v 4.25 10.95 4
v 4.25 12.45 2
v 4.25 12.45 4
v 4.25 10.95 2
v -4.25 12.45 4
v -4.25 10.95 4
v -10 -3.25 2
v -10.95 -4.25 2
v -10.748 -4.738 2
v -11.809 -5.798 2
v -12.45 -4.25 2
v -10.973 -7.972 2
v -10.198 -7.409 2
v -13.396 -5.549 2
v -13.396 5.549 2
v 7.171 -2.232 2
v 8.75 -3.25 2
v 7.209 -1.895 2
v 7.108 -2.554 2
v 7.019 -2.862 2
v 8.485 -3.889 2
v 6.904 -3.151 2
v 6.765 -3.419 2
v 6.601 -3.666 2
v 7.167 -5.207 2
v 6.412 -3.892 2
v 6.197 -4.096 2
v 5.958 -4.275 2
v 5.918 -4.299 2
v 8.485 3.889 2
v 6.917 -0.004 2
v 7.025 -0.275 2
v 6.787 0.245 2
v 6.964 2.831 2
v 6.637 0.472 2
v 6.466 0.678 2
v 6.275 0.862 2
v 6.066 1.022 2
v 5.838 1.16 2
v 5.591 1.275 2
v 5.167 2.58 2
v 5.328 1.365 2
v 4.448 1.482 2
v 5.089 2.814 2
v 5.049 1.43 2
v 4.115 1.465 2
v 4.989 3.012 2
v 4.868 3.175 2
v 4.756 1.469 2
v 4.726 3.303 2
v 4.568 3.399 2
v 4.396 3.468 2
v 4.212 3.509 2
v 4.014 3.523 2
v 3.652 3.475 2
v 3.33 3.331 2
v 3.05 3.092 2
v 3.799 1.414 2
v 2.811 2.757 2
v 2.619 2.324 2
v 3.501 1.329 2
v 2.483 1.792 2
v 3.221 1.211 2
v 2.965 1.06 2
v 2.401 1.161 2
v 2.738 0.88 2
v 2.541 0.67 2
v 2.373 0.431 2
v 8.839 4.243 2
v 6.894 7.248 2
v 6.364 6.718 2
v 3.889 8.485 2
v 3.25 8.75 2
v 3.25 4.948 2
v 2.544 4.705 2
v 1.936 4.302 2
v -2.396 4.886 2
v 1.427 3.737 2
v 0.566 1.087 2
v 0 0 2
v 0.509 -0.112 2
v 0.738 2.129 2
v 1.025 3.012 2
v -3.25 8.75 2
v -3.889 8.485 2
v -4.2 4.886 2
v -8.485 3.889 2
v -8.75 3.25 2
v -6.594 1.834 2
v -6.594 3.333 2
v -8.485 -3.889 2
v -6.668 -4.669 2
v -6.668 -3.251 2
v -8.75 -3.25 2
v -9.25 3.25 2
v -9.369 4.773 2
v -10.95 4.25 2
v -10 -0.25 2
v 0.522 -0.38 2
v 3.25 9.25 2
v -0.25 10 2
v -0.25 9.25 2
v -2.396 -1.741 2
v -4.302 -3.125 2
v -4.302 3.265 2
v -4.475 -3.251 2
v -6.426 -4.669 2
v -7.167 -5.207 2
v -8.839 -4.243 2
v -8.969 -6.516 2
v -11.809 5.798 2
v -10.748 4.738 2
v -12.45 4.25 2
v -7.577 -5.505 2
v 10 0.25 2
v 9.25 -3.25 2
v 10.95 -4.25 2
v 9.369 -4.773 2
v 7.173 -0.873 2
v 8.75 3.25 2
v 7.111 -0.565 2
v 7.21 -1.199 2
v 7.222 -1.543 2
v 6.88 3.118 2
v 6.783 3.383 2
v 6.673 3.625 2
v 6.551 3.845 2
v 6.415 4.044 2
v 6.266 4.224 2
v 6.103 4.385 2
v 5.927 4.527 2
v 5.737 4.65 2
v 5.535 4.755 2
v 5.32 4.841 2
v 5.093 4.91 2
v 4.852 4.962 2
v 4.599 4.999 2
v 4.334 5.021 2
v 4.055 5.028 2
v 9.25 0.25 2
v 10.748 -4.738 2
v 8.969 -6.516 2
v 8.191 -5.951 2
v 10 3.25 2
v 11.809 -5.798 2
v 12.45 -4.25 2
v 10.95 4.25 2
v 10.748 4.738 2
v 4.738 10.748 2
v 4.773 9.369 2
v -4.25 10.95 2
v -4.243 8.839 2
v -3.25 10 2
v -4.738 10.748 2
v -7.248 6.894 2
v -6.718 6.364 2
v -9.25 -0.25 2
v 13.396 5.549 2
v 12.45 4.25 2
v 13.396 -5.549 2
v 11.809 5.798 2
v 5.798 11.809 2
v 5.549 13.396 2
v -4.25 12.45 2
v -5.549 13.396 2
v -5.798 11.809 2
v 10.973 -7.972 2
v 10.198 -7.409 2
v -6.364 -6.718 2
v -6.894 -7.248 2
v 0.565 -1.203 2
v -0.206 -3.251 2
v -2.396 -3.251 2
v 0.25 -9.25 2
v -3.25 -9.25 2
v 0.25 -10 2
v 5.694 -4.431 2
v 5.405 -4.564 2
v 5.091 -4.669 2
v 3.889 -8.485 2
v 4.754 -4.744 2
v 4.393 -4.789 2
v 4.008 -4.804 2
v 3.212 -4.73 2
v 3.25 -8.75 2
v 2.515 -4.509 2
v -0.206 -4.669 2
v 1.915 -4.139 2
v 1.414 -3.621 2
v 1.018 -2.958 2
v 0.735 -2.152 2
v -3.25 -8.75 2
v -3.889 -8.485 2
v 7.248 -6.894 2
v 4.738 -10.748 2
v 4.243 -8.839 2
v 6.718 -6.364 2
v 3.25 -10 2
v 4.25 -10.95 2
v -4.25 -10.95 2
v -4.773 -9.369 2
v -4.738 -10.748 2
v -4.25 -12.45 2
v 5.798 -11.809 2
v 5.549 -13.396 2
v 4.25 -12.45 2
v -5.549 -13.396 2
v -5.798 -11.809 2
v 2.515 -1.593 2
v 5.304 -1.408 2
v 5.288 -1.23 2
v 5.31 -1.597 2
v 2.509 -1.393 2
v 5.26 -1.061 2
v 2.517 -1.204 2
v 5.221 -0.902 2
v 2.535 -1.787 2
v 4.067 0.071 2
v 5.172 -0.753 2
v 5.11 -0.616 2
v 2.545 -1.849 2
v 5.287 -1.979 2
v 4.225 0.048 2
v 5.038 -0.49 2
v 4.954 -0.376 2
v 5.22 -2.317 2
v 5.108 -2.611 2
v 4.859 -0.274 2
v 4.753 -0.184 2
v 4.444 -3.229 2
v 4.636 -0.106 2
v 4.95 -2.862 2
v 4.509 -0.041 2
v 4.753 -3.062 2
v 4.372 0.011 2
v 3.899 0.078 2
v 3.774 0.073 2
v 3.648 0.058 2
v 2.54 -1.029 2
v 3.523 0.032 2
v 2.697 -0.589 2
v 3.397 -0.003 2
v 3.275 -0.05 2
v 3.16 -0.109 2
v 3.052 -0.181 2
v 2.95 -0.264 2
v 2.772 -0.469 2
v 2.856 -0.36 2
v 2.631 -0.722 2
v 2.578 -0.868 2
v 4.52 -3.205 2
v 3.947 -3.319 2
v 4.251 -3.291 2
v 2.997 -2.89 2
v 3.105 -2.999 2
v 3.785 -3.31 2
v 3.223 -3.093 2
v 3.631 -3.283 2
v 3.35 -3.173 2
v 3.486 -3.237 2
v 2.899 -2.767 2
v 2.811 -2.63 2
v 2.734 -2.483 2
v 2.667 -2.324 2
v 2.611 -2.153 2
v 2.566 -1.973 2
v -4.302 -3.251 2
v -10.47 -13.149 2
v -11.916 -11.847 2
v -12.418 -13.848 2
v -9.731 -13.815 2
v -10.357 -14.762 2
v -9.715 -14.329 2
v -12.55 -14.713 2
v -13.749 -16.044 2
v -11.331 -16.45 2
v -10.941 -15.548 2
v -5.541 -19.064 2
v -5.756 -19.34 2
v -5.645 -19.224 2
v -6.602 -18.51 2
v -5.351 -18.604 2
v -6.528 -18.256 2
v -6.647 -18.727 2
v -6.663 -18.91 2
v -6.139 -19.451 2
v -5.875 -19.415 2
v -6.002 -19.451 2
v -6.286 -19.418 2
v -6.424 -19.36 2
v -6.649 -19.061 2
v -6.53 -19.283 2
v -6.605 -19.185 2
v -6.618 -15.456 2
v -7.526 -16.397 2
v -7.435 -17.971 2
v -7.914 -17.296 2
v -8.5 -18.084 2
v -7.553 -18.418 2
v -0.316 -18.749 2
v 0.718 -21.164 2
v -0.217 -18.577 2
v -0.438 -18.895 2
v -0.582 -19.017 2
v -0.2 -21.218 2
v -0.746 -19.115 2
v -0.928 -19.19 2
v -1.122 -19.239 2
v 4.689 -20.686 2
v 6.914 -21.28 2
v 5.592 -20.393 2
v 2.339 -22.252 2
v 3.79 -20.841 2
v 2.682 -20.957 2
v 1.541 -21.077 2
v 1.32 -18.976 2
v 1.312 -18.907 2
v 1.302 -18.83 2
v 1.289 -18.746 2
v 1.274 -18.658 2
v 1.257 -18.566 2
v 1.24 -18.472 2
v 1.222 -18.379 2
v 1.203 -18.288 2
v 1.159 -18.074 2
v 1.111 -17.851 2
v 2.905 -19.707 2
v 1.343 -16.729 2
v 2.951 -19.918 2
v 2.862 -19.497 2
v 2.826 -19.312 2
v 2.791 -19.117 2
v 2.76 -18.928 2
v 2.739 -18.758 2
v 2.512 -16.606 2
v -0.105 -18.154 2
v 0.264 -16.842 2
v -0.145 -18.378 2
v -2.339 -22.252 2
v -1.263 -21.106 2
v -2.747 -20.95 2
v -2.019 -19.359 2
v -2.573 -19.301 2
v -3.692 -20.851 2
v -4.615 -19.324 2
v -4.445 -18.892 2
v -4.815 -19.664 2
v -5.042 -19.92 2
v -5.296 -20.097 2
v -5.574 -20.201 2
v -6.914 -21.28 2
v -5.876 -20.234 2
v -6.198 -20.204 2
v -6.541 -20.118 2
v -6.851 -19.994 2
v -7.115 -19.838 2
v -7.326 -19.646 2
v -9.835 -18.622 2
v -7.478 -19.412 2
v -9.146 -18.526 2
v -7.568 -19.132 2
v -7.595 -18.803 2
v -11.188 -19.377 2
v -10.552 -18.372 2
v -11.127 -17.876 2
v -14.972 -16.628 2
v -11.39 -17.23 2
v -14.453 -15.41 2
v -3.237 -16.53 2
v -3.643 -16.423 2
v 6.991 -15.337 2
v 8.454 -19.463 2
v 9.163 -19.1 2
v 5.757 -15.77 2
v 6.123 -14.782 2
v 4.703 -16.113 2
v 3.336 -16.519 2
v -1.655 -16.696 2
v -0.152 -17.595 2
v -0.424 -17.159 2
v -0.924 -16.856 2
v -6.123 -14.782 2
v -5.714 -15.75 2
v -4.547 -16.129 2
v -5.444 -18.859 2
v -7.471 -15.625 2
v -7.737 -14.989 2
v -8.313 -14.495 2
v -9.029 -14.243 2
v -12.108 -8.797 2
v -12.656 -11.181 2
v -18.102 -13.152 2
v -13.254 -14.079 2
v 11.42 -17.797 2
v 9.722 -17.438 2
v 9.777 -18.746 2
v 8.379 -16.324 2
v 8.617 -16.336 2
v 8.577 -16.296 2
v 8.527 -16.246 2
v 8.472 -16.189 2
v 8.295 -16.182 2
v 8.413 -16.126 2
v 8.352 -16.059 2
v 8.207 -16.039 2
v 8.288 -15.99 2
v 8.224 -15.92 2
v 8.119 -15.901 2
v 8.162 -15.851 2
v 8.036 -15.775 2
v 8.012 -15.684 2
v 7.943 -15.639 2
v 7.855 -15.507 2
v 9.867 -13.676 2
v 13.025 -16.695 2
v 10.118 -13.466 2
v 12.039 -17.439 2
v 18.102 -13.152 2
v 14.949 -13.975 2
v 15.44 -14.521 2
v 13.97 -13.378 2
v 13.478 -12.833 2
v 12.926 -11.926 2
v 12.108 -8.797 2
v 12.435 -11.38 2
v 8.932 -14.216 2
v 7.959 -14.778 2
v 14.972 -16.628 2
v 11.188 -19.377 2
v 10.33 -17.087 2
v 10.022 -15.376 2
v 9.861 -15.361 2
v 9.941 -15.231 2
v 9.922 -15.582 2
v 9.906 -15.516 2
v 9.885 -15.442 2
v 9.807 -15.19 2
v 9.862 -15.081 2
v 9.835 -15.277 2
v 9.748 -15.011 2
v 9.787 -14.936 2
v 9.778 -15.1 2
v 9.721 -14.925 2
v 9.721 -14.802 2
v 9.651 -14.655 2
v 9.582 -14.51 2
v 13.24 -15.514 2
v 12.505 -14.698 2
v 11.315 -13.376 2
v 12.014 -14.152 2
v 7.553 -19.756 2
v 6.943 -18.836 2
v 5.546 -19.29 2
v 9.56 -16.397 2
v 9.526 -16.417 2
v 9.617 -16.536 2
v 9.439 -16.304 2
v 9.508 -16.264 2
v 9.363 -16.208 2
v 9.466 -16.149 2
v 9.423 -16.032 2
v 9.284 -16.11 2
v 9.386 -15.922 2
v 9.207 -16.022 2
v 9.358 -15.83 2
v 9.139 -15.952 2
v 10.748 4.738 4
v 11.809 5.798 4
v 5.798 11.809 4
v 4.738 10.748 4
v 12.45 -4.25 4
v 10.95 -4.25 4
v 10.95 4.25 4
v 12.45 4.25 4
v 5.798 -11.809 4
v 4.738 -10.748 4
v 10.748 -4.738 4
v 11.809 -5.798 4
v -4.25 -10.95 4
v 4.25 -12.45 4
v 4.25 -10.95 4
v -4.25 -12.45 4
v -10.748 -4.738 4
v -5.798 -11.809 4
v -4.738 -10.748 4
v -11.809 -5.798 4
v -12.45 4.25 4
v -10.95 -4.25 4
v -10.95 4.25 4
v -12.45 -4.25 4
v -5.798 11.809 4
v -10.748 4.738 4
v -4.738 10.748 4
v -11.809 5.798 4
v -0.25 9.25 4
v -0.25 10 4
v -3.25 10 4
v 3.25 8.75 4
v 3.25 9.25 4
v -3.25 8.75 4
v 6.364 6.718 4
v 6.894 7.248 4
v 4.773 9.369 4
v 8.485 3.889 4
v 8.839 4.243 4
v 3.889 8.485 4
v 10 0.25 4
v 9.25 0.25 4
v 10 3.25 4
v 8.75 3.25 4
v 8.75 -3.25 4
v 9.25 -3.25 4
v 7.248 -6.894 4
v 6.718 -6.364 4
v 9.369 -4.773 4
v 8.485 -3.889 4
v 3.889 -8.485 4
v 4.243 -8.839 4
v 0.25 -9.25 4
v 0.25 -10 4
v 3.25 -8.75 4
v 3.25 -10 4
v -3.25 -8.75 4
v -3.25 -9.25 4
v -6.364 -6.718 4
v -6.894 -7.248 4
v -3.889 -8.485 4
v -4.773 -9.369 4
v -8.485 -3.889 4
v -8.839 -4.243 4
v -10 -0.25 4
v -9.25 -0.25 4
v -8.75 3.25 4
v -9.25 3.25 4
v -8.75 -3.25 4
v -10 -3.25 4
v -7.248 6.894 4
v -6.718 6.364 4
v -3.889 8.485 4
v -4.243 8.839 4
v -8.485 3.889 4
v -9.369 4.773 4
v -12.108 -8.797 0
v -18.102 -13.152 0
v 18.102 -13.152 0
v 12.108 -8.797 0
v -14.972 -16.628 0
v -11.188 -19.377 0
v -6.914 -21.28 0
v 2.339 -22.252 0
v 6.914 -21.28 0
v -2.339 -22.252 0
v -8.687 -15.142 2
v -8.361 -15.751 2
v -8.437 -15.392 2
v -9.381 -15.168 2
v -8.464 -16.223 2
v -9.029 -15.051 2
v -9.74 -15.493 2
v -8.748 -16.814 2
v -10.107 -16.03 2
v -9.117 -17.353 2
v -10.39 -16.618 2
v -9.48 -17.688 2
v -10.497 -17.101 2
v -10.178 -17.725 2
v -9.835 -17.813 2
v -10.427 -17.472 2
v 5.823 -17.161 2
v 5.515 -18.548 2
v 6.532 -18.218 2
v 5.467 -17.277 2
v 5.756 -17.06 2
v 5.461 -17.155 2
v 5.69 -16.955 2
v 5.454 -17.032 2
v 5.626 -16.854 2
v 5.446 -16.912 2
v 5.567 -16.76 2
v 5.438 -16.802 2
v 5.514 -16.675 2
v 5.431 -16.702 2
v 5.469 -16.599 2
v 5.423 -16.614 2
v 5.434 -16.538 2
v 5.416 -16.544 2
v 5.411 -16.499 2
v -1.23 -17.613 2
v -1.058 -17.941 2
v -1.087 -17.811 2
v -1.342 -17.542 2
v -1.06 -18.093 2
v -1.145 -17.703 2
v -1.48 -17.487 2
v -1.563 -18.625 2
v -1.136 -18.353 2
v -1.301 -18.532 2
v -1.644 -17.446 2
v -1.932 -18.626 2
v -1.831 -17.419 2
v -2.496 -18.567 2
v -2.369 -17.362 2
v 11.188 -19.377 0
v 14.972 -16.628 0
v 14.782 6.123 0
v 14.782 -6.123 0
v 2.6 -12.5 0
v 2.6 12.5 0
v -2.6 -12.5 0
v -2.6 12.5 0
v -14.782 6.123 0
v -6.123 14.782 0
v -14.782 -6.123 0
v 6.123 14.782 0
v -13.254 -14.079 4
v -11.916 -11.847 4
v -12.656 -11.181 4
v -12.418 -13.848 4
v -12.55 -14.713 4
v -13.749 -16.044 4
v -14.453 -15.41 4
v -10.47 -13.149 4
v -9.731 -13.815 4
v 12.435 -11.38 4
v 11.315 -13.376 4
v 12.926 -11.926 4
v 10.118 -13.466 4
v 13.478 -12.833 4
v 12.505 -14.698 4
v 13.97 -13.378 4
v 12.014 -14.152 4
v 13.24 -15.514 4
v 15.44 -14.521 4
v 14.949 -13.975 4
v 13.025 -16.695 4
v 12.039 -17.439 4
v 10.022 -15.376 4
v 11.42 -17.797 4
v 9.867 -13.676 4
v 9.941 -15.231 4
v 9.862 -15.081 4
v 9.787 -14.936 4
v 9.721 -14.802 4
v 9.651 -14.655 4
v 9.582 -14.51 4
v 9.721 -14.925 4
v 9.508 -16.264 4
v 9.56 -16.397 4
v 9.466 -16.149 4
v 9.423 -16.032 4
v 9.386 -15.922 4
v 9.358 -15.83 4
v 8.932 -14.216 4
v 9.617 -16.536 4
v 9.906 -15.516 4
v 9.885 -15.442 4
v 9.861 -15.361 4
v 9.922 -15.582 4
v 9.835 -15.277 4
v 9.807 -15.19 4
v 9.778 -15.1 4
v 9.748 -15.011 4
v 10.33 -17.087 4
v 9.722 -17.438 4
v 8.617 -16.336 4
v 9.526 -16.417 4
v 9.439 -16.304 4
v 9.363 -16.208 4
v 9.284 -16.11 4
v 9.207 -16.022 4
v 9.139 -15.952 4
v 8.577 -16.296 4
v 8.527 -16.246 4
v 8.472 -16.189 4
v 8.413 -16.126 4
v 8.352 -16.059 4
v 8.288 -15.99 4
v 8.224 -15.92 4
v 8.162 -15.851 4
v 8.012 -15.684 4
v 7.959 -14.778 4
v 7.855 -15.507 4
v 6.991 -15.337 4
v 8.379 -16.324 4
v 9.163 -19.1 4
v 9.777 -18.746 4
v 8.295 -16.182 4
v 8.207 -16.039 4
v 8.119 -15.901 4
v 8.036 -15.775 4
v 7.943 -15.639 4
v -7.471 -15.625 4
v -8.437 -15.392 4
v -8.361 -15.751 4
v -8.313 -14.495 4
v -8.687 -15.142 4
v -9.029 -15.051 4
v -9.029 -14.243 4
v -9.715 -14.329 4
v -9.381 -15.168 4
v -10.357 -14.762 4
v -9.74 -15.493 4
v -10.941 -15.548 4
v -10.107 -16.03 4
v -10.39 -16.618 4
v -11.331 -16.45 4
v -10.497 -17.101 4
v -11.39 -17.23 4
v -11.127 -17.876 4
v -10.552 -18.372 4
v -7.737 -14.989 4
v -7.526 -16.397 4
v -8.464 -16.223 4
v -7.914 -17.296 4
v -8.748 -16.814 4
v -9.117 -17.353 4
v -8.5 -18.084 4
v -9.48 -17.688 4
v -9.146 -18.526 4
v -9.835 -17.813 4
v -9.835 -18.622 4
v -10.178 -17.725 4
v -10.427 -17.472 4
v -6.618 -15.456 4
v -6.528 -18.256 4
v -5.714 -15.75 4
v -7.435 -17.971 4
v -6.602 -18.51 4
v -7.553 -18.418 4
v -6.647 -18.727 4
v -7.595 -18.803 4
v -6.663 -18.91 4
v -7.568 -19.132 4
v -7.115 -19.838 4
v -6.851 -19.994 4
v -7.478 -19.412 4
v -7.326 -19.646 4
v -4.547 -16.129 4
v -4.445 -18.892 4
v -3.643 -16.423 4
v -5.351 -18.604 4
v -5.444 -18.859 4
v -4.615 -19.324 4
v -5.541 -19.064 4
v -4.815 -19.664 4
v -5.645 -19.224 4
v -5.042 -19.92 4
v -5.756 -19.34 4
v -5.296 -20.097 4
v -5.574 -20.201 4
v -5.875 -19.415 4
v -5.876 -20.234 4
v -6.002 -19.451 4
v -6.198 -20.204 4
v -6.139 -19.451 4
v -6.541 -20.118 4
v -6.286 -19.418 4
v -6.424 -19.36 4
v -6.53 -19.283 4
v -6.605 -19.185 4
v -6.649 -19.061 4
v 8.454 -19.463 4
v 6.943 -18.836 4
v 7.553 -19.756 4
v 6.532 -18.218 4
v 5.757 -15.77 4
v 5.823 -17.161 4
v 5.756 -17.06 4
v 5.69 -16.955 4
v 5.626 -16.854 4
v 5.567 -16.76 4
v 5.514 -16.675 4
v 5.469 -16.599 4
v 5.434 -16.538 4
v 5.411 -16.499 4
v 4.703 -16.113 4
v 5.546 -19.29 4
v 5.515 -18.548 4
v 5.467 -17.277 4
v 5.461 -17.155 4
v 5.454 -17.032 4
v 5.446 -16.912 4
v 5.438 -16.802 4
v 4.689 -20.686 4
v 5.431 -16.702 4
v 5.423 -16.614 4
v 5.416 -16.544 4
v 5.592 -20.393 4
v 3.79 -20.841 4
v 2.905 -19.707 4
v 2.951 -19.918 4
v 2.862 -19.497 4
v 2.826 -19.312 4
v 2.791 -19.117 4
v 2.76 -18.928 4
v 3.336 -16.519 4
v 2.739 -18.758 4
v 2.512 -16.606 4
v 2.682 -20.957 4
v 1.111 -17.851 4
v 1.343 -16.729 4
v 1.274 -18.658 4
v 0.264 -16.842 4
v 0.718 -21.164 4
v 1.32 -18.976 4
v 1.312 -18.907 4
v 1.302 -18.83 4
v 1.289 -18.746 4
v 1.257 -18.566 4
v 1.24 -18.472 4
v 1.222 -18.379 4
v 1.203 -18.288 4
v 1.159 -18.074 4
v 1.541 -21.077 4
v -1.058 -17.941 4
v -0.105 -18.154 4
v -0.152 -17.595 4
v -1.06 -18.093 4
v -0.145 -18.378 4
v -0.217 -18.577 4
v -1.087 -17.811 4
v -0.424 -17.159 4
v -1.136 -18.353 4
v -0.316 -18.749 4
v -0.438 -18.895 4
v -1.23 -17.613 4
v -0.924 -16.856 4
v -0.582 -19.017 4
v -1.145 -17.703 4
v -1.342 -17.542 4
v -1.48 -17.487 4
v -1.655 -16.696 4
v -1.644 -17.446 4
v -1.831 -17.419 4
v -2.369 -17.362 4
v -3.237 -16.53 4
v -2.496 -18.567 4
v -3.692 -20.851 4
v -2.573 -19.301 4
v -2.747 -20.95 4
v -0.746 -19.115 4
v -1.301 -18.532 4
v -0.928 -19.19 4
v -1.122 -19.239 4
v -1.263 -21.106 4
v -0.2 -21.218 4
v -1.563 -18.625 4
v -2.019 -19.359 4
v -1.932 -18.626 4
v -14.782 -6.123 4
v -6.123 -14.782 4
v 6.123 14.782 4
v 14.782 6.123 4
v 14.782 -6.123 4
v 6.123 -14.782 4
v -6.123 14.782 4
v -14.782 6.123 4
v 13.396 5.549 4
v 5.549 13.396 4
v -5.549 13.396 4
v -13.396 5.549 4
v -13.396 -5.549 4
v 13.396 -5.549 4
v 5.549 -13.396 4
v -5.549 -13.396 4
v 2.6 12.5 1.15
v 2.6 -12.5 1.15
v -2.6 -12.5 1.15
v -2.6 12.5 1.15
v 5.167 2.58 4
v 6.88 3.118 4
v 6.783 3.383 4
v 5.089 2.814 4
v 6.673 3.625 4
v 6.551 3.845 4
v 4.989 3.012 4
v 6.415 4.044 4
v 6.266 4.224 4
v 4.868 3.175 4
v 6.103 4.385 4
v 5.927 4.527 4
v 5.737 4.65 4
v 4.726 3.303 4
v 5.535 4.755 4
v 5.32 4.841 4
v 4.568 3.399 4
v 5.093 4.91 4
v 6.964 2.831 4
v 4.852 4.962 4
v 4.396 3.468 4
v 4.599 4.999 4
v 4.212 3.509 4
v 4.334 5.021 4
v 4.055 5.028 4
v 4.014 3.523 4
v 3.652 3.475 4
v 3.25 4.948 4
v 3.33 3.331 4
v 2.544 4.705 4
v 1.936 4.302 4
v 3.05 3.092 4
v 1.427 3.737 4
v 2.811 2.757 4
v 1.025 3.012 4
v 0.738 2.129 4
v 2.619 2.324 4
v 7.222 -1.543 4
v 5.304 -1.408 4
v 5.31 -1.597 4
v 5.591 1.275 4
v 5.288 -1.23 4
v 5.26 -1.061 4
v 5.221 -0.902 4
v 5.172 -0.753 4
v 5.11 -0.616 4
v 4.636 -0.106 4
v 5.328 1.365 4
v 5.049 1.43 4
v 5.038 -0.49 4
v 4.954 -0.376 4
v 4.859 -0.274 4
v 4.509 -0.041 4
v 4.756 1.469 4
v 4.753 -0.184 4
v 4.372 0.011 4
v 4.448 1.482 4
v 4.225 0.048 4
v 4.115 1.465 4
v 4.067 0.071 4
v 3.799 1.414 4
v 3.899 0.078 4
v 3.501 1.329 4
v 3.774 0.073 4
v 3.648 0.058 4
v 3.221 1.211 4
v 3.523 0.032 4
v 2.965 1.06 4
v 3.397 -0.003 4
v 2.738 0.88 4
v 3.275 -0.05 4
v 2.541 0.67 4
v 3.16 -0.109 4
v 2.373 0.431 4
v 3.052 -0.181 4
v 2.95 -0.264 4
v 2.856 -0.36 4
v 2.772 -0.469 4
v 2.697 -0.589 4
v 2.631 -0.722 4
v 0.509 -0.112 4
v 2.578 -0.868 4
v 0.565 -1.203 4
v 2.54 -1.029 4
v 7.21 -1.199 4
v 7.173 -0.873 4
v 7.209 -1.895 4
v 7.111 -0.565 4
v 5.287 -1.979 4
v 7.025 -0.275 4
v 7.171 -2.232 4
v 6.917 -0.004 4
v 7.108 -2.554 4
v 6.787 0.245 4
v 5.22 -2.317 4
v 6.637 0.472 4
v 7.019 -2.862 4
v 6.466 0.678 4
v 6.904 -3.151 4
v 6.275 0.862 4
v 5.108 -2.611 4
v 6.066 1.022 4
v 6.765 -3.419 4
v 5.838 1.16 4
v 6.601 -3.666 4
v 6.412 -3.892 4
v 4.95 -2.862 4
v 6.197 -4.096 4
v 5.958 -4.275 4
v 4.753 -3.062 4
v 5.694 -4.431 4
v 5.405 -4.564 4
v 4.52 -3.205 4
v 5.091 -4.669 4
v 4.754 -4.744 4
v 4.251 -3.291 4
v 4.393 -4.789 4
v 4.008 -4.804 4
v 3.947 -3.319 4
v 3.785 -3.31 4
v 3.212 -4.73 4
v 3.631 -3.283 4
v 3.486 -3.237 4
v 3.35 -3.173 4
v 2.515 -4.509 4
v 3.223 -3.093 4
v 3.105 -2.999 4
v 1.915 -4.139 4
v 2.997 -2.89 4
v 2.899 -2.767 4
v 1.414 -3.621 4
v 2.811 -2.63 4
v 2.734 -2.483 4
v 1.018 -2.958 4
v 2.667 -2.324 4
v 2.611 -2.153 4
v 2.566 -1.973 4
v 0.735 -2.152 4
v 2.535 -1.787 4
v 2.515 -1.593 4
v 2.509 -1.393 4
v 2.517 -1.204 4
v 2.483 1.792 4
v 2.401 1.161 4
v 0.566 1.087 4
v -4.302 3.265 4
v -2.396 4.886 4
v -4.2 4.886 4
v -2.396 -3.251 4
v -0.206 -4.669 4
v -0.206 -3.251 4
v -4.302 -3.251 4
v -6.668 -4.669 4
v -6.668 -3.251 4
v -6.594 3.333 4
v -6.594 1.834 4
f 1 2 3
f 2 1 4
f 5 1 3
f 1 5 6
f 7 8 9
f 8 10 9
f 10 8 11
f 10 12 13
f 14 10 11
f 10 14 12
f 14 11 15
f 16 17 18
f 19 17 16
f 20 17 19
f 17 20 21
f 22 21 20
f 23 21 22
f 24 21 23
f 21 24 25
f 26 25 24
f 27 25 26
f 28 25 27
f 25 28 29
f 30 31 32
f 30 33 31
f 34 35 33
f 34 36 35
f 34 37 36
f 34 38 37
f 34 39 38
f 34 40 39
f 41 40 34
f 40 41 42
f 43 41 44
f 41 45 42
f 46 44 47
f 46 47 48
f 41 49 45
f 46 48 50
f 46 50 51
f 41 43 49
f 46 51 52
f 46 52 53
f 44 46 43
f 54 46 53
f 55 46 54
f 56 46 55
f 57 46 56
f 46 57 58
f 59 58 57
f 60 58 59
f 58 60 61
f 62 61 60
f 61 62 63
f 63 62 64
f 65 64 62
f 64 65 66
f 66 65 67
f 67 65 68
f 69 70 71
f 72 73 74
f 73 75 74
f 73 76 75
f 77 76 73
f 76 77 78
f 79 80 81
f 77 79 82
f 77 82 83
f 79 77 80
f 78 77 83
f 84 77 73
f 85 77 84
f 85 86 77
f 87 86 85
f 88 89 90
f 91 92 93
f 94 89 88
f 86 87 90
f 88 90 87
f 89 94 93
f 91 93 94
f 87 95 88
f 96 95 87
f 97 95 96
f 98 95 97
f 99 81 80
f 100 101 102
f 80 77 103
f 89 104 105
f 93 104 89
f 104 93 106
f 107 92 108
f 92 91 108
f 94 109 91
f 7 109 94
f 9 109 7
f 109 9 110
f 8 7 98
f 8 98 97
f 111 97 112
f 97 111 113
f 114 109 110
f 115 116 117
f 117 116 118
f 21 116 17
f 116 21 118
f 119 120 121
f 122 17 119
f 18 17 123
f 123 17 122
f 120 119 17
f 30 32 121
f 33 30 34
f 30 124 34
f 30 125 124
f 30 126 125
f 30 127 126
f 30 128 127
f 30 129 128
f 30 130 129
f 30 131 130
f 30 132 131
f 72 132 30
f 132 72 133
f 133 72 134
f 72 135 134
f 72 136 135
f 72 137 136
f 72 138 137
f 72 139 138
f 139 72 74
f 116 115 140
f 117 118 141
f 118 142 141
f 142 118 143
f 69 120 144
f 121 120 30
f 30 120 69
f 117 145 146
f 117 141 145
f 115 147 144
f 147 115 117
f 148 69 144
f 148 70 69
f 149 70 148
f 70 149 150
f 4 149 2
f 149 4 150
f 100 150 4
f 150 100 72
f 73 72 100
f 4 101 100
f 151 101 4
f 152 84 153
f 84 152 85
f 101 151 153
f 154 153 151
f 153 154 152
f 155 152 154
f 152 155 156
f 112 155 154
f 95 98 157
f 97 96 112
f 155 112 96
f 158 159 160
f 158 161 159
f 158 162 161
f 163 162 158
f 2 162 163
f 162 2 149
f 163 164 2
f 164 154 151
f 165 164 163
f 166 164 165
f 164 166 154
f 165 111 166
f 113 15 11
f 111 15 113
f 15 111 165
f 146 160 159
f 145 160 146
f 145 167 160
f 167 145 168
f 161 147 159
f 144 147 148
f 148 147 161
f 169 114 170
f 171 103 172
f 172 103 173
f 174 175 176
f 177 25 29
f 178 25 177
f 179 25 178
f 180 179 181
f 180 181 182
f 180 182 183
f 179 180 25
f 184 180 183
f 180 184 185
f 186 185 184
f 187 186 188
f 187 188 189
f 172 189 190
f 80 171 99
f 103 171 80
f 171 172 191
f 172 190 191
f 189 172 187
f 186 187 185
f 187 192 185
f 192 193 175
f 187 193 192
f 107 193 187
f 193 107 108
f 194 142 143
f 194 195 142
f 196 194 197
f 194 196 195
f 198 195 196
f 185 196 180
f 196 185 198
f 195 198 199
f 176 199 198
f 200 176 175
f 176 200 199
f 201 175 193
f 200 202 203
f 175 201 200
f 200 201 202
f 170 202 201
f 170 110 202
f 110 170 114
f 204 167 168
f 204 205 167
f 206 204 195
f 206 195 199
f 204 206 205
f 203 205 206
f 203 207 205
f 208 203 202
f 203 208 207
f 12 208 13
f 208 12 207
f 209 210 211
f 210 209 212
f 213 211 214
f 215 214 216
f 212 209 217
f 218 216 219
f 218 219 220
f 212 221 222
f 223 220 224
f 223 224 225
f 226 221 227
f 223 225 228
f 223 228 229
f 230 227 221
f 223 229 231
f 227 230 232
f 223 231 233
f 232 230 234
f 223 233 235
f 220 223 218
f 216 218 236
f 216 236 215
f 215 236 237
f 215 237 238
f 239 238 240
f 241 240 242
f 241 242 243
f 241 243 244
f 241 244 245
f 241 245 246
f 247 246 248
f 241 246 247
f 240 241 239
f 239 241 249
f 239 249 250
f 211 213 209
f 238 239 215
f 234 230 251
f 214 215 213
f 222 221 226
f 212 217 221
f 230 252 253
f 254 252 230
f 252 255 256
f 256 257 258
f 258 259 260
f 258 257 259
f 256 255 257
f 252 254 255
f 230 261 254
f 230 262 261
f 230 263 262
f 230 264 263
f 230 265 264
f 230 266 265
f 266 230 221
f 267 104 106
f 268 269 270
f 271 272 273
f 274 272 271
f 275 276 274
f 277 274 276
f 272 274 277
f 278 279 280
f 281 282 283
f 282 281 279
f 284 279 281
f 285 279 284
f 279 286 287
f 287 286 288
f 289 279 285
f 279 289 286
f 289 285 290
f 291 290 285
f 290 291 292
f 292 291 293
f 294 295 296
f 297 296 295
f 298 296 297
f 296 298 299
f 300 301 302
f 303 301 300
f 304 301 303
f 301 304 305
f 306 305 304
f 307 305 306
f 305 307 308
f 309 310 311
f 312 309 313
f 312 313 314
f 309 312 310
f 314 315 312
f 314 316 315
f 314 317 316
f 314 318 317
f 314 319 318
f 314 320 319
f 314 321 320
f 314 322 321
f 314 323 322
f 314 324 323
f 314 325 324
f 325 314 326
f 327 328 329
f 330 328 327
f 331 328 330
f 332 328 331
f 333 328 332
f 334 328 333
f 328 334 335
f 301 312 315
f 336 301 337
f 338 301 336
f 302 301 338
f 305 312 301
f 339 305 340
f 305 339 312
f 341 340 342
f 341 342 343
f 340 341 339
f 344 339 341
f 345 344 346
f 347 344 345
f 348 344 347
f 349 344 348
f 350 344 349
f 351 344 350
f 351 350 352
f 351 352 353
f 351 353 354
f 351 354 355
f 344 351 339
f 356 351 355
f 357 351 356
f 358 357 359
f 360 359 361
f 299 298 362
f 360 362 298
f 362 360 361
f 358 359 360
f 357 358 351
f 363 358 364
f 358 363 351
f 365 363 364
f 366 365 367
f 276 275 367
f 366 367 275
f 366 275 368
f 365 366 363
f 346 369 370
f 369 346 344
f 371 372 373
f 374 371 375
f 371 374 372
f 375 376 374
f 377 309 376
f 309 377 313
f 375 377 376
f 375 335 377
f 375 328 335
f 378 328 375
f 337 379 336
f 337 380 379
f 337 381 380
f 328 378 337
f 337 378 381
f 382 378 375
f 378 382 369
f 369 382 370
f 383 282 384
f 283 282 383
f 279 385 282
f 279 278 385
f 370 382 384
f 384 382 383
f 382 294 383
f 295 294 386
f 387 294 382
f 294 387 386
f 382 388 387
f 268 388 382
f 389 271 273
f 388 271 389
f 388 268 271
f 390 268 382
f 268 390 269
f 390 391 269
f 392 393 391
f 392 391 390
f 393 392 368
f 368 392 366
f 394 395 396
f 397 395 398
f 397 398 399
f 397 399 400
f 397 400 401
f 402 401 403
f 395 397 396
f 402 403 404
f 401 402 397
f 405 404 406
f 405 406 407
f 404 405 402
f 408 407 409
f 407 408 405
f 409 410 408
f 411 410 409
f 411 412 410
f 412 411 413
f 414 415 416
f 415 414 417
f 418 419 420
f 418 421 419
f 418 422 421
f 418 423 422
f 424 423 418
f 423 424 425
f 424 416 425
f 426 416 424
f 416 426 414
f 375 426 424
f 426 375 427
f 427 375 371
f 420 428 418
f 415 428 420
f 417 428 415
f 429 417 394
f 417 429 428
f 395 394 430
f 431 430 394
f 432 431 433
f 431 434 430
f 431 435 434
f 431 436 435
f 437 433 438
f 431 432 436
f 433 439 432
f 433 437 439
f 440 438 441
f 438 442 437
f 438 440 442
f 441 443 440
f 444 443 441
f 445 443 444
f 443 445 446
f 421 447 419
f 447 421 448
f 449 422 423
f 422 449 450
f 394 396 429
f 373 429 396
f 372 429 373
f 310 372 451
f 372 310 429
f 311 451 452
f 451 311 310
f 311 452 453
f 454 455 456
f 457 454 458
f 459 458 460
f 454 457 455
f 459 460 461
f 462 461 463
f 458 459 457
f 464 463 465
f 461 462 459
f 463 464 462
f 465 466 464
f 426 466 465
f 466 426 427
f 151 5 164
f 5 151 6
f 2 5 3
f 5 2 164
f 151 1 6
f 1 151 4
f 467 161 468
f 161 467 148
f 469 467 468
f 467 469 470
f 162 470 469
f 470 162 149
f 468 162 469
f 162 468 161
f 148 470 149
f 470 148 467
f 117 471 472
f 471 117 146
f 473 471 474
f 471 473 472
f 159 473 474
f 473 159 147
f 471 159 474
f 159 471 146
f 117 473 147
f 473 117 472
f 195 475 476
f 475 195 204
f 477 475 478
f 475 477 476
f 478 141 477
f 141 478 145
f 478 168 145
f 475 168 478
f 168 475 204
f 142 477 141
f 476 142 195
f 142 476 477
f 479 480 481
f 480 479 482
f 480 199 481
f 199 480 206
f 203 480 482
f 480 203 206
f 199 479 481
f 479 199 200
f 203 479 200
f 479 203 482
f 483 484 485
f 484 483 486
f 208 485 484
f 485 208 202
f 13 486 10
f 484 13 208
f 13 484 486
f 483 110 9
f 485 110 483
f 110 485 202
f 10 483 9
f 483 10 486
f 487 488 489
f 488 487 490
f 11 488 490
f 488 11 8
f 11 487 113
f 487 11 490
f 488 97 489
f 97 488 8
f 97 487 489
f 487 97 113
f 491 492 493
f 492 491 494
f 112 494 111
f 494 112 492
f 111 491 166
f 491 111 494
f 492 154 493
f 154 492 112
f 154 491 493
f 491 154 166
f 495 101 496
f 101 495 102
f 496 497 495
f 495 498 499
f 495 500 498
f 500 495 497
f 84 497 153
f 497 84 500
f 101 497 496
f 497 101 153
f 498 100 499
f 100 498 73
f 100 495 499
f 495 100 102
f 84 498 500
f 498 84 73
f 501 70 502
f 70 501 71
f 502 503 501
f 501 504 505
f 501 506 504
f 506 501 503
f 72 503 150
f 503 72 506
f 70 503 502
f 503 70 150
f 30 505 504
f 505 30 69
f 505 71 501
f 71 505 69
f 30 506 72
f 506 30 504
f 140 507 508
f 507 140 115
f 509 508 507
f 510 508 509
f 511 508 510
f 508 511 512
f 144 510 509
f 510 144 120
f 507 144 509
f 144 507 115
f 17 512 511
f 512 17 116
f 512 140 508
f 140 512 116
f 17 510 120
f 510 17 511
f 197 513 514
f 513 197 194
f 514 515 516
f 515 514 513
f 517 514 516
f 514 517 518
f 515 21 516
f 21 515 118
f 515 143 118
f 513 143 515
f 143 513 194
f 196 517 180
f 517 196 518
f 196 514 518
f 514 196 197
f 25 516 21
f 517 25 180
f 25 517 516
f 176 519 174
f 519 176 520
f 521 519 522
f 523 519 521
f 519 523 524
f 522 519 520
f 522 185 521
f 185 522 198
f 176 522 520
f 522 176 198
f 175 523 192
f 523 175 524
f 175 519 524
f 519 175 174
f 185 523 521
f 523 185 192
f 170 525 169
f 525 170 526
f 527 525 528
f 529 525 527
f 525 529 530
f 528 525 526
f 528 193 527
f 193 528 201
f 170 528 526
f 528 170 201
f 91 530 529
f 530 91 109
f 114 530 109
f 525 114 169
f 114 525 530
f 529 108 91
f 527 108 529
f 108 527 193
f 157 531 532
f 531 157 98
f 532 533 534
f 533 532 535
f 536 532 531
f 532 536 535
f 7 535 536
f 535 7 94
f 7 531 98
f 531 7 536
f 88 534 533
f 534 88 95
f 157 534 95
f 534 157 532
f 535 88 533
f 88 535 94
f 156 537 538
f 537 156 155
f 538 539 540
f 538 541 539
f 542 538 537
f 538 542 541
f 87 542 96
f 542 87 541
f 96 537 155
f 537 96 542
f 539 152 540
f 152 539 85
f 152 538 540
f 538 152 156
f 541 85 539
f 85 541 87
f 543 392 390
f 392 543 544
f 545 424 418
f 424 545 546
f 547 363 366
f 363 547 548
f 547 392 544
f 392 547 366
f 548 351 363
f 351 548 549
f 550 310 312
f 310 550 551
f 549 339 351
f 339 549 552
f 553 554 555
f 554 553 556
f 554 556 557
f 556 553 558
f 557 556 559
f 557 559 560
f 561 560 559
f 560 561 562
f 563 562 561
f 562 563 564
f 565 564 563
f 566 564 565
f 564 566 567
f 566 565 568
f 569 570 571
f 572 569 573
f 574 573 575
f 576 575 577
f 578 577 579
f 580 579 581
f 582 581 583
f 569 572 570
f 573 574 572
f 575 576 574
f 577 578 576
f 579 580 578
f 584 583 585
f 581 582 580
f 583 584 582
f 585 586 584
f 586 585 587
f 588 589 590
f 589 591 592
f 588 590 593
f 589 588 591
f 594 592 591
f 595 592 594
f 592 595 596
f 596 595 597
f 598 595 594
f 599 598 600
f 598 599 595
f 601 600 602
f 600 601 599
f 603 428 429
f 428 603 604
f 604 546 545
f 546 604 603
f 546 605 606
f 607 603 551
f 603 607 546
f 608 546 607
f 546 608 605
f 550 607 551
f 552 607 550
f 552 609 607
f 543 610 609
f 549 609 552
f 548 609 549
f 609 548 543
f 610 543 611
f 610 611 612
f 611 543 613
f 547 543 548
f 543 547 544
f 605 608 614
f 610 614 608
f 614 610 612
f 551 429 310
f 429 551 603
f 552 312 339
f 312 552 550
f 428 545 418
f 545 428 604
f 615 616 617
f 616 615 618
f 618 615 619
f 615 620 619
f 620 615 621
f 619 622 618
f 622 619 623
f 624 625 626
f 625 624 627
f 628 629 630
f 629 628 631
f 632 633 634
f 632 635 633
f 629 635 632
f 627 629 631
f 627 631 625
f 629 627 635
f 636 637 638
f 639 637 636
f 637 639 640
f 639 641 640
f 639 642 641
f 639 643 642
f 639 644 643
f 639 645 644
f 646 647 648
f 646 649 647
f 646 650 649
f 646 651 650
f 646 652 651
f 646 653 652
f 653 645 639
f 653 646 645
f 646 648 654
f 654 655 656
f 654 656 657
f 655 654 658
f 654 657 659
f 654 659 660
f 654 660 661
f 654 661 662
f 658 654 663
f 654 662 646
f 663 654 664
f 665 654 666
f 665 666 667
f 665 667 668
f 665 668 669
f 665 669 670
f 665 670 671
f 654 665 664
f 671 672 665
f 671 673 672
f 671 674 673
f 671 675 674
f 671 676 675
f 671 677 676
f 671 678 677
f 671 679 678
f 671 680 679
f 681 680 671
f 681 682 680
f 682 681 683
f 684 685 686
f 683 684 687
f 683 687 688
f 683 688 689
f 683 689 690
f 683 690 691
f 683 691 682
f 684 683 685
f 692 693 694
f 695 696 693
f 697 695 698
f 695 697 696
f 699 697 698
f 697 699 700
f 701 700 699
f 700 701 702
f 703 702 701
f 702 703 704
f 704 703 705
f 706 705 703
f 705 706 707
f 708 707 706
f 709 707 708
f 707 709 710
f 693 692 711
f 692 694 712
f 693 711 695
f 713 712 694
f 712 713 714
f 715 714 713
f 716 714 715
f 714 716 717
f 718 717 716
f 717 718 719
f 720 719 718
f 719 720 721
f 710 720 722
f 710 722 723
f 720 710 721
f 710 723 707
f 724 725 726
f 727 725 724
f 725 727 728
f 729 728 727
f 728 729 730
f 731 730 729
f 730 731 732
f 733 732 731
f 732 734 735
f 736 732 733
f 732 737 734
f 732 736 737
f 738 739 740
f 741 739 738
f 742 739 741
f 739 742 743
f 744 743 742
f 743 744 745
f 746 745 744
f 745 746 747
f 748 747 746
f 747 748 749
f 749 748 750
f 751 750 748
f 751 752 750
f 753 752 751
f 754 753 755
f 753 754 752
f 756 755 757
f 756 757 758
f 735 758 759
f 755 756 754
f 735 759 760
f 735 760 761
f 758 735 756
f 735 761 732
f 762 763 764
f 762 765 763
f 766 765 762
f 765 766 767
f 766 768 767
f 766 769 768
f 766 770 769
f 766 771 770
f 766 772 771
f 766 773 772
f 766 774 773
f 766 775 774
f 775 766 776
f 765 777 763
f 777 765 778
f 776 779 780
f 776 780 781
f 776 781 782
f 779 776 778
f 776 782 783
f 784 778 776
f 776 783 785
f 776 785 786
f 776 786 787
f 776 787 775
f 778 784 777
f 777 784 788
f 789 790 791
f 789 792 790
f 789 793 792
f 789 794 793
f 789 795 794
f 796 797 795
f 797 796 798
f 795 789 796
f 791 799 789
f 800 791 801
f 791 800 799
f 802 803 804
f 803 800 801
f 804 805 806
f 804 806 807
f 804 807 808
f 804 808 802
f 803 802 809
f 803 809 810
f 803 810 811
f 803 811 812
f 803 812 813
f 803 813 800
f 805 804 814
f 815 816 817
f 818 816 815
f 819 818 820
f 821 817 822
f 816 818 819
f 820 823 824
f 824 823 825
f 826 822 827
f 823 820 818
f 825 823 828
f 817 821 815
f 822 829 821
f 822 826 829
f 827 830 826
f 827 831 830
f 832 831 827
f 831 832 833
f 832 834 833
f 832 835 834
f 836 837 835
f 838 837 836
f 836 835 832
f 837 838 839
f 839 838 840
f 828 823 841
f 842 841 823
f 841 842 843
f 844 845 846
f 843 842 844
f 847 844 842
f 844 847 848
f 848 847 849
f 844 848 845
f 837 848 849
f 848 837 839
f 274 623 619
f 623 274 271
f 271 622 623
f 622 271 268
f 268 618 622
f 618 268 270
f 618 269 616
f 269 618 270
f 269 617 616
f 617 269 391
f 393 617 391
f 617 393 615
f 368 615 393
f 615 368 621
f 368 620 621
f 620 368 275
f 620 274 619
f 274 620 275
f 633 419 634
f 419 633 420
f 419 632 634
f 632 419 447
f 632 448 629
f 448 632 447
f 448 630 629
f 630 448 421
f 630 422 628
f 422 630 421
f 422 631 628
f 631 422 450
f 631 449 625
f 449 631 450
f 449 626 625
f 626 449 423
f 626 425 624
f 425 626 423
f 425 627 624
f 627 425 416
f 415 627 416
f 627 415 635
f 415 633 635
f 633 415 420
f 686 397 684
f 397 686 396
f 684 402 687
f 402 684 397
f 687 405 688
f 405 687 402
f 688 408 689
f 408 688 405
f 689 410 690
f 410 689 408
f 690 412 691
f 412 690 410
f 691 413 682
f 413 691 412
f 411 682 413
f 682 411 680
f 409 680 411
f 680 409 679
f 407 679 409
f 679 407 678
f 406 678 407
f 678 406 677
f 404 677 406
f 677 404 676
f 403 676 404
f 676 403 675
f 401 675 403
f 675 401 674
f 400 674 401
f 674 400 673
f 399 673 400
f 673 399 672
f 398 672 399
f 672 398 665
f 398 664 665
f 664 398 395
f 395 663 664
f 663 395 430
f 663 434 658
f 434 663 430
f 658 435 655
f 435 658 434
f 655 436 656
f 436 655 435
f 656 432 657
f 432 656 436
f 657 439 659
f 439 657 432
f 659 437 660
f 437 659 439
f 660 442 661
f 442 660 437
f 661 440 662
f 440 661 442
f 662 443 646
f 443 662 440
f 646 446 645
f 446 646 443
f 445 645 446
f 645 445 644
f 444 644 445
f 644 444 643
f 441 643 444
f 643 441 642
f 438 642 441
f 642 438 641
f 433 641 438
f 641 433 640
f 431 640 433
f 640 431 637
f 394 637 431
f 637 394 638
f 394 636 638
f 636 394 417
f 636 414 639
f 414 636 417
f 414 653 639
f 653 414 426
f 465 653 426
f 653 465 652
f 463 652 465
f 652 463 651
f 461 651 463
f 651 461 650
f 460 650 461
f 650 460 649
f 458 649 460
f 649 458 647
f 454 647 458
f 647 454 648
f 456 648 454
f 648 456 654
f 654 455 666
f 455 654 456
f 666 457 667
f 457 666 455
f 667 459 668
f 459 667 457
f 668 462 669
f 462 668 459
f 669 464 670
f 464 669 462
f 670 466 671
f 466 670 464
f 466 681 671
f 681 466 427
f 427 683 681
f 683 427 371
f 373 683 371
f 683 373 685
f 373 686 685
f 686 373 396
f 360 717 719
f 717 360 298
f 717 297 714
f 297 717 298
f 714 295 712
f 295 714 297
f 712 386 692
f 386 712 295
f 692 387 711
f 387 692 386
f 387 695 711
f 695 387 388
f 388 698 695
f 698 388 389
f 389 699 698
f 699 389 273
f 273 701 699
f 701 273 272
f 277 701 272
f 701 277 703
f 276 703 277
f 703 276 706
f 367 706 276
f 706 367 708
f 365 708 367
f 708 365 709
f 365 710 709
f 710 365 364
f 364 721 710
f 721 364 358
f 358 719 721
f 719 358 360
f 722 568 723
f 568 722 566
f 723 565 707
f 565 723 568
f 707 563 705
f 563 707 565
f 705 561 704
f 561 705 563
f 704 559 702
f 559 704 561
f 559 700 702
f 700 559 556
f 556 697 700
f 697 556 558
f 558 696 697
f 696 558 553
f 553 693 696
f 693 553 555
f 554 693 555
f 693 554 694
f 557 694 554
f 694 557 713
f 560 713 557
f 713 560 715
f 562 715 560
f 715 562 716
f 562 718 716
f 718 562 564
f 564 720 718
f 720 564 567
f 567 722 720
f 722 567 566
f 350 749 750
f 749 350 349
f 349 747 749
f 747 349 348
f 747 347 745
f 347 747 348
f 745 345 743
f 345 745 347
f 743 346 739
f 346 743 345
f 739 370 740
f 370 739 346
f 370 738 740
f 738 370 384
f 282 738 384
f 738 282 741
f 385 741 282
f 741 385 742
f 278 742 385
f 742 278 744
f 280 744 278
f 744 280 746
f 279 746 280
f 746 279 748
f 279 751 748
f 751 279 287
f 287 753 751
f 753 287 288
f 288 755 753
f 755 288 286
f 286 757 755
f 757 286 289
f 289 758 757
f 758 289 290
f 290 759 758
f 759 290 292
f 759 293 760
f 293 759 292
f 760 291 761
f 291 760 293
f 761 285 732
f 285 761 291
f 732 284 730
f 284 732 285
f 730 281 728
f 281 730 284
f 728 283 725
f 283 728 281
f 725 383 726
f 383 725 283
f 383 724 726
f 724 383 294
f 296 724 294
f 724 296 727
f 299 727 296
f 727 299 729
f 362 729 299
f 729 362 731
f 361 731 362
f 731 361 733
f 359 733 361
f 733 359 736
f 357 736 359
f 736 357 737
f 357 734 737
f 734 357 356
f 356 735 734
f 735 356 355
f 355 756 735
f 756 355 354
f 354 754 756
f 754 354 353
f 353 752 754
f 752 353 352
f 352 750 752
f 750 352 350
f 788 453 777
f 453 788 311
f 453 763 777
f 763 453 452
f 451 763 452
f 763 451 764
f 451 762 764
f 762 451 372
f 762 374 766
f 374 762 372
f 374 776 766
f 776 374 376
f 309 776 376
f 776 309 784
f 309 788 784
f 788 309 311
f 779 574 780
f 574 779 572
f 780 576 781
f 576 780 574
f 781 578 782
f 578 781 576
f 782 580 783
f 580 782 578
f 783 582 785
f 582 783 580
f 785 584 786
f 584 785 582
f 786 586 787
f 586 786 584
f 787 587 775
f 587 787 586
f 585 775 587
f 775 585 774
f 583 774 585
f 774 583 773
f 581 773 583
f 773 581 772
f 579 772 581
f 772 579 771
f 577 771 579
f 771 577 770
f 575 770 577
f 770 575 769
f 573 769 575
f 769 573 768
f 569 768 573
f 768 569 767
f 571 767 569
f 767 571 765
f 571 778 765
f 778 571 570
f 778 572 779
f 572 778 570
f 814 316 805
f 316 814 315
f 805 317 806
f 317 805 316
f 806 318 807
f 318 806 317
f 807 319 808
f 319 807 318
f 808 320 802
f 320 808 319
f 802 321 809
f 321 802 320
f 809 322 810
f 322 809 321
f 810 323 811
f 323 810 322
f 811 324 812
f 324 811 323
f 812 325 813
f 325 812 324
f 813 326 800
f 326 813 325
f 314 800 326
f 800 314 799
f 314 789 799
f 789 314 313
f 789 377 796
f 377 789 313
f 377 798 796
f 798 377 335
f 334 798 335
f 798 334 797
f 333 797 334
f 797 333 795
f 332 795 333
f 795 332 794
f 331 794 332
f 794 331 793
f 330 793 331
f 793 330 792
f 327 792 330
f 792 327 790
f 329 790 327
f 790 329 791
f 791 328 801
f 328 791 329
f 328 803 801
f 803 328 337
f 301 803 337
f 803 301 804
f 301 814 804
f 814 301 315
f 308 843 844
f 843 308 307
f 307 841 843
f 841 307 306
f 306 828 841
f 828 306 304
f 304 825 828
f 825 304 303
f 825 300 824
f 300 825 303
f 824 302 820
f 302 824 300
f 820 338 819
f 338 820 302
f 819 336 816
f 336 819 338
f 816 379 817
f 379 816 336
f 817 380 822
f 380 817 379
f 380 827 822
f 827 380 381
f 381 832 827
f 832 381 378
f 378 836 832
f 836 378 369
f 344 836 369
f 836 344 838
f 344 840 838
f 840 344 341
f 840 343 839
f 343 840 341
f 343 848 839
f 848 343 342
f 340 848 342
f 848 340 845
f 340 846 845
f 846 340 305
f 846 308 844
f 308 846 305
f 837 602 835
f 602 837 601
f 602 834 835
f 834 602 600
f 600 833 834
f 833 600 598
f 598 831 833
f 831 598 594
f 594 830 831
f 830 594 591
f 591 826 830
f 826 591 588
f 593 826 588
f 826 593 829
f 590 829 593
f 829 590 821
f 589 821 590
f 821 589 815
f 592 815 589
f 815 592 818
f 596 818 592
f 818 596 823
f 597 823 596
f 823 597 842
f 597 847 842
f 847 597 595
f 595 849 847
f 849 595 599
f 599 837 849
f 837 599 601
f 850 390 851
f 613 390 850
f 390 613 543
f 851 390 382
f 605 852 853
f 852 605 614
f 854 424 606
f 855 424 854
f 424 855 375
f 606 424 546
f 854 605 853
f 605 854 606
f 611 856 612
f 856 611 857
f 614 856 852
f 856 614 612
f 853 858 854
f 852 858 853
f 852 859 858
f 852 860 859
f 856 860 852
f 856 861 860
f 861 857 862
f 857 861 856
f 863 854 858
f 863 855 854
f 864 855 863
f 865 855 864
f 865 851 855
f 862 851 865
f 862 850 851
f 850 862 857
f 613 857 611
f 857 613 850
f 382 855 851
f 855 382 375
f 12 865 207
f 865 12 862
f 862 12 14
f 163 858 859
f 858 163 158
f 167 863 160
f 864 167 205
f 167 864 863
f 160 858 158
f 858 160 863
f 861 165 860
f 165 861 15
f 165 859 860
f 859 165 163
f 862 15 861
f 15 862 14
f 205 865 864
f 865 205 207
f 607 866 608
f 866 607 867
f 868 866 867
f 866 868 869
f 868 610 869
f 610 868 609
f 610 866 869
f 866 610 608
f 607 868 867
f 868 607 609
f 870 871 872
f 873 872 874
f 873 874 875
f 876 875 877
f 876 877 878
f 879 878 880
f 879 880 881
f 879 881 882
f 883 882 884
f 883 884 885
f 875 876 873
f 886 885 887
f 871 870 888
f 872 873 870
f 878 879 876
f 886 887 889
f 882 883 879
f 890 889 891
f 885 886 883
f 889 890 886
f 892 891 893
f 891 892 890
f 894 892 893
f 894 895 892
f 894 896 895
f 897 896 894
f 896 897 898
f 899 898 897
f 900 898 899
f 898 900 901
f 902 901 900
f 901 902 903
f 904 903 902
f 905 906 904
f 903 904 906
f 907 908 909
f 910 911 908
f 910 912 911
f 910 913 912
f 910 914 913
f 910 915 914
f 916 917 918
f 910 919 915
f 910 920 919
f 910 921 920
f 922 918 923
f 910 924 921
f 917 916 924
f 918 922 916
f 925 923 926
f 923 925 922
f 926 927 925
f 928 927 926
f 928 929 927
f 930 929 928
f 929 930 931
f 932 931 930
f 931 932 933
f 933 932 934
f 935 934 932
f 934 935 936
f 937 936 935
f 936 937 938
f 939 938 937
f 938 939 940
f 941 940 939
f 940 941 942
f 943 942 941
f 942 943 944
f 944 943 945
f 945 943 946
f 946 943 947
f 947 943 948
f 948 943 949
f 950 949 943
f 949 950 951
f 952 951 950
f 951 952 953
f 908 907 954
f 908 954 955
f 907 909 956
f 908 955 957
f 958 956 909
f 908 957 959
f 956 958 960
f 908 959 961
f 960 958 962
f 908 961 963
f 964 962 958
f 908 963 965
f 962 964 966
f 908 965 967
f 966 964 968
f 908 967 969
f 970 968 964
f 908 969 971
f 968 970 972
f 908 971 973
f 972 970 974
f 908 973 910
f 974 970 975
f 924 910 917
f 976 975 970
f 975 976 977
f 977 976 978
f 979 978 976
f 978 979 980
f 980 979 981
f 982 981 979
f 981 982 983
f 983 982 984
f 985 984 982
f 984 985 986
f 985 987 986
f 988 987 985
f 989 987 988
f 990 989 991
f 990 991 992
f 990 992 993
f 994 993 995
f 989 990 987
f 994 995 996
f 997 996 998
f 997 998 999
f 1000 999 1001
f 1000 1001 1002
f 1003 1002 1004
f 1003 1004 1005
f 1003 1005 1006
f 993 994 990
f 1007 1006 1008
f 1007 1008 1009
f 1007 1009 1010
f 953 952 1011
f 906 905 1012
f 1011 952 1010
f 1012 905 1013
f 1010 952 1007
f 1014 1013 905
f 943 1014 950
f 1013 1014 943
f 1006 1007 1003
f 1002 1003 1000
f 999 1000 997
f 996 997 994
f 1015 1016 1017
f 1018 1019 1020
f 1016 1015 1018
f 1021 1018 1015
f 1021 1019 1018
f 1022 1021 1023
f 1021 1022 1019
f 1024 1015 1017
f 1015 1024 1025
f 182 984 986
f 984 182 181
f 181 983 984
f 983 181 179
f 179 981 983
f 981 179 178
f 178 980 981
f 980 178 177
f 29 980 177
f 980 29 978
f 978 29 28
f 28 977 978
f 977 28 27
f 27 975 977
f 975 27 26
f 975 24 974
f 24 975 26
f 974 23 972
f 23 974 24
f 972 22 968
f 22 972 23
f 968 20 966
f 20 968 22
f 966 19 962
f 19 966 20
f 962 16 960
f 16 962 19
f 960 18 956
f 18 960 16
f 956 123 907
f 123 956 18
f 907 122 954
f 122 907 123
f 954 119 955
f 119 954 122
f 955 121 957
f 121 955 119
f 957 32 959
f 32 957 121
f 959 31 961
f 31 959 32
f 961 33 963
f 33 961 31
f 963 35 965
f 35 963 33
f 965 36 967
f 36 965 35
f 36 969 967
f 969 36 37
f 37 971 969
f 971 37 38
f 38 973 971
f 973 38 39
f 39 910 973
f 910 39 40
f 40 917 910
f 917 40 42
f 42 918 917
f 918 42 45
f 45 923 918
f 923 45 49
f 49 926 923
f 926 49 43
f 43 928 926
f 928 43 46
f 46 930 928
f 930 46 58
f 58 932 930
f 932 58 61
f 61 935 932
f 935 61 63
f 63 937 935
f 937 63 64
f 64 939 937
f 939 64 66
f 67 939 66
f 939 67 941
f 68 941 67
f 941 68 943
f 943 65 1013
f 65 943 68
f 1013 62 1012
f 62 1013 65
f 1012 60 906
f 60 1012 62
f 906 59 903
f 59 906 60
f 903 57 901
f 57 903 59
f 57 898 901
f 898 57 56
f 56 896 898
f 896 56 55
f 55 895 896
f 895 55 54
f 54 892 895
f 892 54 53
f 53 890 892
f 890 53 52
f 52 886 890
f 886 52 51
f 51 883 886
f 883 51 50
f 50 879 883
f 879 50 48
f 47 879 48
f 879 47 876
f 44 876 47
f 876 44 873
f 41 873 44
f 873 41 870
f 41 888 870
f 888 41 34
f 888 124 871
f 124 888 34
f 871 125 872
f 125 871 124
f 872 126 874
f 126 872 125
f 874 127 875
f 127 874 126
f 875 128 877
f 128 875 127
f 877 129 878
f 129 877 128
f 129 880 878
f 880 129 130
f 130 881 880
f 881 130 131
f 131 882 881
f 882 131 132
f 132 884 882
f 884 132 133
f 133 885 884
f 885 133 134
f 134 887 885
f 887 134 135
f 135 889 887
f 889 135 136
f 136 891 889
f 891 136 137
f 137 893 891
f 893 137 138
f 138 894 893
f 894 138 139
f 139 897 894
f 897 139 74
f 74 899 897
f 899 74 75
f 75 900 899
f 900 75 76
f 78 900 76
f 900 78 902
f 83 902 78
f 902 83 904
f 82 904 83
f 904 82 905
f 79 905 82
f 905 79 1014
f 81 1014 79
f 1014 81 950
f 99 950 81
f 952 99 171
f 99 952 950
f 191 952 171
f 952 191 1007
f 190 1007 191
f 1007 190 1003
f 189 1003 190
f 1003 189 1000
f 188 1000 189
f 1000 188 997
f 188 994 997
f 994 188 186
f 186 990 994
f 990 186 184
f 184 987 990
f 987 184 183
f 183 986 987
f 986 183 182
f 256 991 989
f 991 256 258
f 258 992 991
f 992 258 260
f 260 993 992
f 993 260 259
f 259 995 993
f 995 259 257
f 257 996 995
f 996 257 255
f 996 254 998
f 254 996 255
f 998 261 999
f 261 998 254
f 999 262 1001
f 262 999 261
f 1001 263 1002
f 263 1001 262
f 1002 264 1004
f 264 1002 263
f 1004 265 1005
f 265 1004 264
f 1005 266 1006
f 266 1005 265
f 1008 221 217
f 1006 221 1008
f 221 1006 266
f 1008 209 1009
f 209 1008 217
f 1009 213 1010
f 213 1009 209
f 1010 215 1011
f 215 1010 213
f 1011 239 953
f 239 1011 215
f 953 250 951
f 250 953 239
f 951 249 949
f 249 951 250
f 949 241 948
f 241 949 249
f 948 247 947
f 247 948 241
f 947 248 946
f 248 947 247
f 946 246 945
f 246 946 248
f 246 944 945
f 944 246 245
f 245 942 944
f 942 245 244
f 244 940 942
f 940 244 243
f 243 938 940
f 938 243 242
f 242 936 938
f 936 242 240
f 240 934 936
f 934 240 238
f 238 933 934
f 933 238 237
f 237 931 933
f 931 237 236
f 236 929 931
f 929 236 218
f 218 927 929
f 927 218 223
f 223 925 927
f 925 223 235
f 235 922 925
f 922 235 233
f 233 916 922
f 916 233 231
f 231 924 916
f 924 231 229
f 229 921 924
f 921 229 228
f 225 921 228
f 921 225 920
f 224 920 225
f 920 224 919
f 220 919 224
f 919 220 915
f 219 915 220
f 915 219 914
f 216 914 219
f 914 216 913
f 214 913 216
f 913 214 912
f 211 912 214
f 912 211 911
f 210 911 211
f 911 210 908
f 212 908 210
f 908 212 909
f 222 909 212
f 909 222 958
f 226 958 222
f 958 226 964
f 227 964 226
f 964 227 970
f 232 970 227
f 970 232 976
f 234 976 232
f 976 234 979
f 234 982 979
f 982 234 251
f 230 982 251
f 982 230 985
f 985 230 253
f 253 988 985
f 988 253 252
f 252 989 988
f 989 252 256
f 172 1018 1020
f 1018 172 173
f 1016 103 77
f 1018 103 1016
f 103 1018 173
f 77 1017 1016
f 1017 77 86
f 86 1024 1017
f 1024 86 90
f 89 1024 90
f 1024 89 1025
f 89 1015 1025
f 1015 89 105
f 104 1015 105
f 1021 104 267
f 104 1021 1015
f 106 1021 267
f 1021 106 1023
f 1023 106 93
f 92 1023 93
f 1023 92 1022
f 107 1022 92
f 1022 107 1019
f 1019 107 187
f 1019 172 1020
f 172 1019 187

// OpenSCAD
/* [Parameters] */
// Ingress Agent Level
ingress_level = 16; // [1:16]

// Ingress Game Name
in_game_name = "YOURNAME";

/* [Hidden] */
_ASCII_SPACE 	= 32;
_ASCII_0 		= 48;
_ASCII_9 		= _ASCII_0 + 9;
_ASCII_UPPER_A 	= 65;
_ASCII_UPPER_Z 	= _ASCII_UPPER_A + 25;
_ASCII_LOWER_A 	= 97;
_ASCII_LOWER_Z 	= _ASCII_LOWER_A + 25;
_ASCII = "\t\n\r !\"#$%&'()*+,-./0123456789:;<=>?@ABCDEFGHIJKLMNOPQRSTUVWXYZ[\\]^_`abcdefghijklmnopqrstuvwxyz{|}~";
_ASCII_HACK = "\""; // only here to work around syntax highlighter defficiencies in certain text editors
_WHITESPACE = " \t\r\n";
_ASCII_CODE = concat(9,10,13, [for(i=[_ASCII_SPACE : _ASCII_LOWER_Z+4]) i]);

radius = 19;

ingress_ign = upper(in_game_name);

// Generate the outer ring of blocks
for (a =[0:min(7, ingress_level - 1)])
{
    rotate([0, 0, a * -45])
    {
        translate([0, 11.7, 3.0])
        {
            cube([8.5, 1.5, 2.0], true);
        }
    }
}

// Generate the inner ring of double blocks for ingress_level 9 and above
if (ingress_level > 8)
{
    for (a =[0:(ingress_level - 9)])
    {
        rotate([0, 0, a * -45])
        {
            translate([0, 9.0, 3.0])
            {
                translate([-1.75, 0.5, 0.0])
                {
                    cube([3.0, 1.0, 2.0], true);
                }
                cube([6.5, 0.5, 2.0], true);
            }
        }
    }
}

// Add the level as text in the centre
translate([0, 0, 2.0])
{
    linear_extrude(2.0)
    {
        text(str(ingress_level), font = "Liberation Sans:style=Bold", valign="center", halign="center");
    }
}

difference()
{
    union()
    {
        translate([0, -radius, 0])
        {
            revolve_text(radius, ingress_ign);
        }

        difference()
        {
            // Octagonal block
            linear_extrude(4.0)
            {
                rotate([0, 0, 22.5])
                {
                    regular_polygon(8, 16.0);
                }
            }

            // Octagonal cut out to contain detail
            translate([0, 0, 2.0])
            {
                linear_extrude(2.01)
                {
                    rotate([0, 0, 22.5])
                    {
                        regular_polygon(8, 14.5);
                    }
                }
            }
        }
    }
    // Cut out for badge pin
    translate([-2.6, -12.5, -0.05])
    {
        cube([5.2, 25, 1.2]);
    }
}

// From https://en.wikibooks.org/wiki/OpenSCAD_User_Manual/Using_the_2D_Subsystem#regular_polygon
module regular_polygon(order, r=1){
    angles=[ for (i = [0:order-1]) i*(360/order) ];
    coords=[ for (th=angles) [r*cos(th), r*sin(th)] ];
    polygon(coords);
}

module revolve_text(radius, chars)
{
    chars_len = len(chars);
    font_size = min(radius / 4, 90 / chars_len);
    // step_angle = 360 / chars_len;
    step_angle = min(12, 180 / chars_len);
    offset = step_angle * (chars_len - 1) / 2;
    
    translate([0, radius, 2.0])
    {
        linear_extrude(2.0)
        {
            for(i = [0 : chars_len - 1])
            {
                rotate((i * step_angle) - offset)
                {
                    translate([0, -(radius), 0])
                    {
                        text(
                            chars[i], 
                            font = "Liberation Mono:style=Bold", 
                            size = font_size, 
                            valign = "center", halign = "center"
                            );
                    }
                }
            }
        }
    }
    backing = step_angle * (chars_len + 1);
    translate([0, radius, 0])
    {
        pie(radius + font_size / 2 + 1, backing, 2.0, -(90 + backing / 2));
    }
}

// PieTest

/**
* @author: Marcel Jira

 * This module generates a pie slice in OpenSCAD. It is inspired by the
 * [dotscad](https://github.com/dotscad/dotscad)
 * project but uses a different approach.
 * I cannot say if this approach is worse or better.

 * @param float radius Radius of the pie
 * @param float angle  Angle (size) of the pie to slice
 * @param float height Height (thickness) of the pie
 * @param float spin   Angle to spin the slice on the Z axis
 */
module pie(radius, angle, height, spin=0) {
	// calculations
	ang = angle % 360;
	absAng = abs(ang);
	halfAng = absAng % 180;
	negAng = min(ang, 0);

	// submodules
	module pieCube() {
		translate([-radius - 1, 0, -1]) {
			cube([2*(radius + 1), radius + 1, height + 2]);
		}
	}

	module rotPieCube() {
		rotate([0, 0, halfAng]) {
			pieCube();
		}
	}

	if (angle != 0) {
		if (ang == 0) {
			cylinder(r=radius, h=height);
		} else {
			rotate([0, 0, spin + negAng]) {
				intersection() {
					cylinder(r=radius, h=height);
					if (absAng < 180) {
						difference() {
							pieCube();
							rotPieCube();
						}
					} else {
						union() {
							pieCube();
							rotPieCube();
						}
					}
				}
			}
		}
	}
}

function upper(string) = 
	let(code = ascii_code(string))
	join([for (i = [0:len(string)-1])
			code[i] >= 97 && code[i] <= 122?
                chr(code[i]-97+65)
            :
                string[i]
		]);
                
function join(strings, delimeter="") = 
	strings == undef?
		undef
	: strings == []?
		""
	: _join(strings, len(strings)-1, delimeter, 0);
function _join(strings, index, delimeter) = 
	index==0 ? 
		strings[index] 
	: str(_join(strings, index-1, delimeter), delimeter, strings[index]) ;
	
function ascii_code(string) = 
	!is_string(string)?
		undef
    :
        [for (result = search(string, _ASCII, 0)) 
            result == undef?
                undef
            :
                _ASCII_CODE[result[0]]
        ]
	;

function is_string(x) = 
	x == str(x);
